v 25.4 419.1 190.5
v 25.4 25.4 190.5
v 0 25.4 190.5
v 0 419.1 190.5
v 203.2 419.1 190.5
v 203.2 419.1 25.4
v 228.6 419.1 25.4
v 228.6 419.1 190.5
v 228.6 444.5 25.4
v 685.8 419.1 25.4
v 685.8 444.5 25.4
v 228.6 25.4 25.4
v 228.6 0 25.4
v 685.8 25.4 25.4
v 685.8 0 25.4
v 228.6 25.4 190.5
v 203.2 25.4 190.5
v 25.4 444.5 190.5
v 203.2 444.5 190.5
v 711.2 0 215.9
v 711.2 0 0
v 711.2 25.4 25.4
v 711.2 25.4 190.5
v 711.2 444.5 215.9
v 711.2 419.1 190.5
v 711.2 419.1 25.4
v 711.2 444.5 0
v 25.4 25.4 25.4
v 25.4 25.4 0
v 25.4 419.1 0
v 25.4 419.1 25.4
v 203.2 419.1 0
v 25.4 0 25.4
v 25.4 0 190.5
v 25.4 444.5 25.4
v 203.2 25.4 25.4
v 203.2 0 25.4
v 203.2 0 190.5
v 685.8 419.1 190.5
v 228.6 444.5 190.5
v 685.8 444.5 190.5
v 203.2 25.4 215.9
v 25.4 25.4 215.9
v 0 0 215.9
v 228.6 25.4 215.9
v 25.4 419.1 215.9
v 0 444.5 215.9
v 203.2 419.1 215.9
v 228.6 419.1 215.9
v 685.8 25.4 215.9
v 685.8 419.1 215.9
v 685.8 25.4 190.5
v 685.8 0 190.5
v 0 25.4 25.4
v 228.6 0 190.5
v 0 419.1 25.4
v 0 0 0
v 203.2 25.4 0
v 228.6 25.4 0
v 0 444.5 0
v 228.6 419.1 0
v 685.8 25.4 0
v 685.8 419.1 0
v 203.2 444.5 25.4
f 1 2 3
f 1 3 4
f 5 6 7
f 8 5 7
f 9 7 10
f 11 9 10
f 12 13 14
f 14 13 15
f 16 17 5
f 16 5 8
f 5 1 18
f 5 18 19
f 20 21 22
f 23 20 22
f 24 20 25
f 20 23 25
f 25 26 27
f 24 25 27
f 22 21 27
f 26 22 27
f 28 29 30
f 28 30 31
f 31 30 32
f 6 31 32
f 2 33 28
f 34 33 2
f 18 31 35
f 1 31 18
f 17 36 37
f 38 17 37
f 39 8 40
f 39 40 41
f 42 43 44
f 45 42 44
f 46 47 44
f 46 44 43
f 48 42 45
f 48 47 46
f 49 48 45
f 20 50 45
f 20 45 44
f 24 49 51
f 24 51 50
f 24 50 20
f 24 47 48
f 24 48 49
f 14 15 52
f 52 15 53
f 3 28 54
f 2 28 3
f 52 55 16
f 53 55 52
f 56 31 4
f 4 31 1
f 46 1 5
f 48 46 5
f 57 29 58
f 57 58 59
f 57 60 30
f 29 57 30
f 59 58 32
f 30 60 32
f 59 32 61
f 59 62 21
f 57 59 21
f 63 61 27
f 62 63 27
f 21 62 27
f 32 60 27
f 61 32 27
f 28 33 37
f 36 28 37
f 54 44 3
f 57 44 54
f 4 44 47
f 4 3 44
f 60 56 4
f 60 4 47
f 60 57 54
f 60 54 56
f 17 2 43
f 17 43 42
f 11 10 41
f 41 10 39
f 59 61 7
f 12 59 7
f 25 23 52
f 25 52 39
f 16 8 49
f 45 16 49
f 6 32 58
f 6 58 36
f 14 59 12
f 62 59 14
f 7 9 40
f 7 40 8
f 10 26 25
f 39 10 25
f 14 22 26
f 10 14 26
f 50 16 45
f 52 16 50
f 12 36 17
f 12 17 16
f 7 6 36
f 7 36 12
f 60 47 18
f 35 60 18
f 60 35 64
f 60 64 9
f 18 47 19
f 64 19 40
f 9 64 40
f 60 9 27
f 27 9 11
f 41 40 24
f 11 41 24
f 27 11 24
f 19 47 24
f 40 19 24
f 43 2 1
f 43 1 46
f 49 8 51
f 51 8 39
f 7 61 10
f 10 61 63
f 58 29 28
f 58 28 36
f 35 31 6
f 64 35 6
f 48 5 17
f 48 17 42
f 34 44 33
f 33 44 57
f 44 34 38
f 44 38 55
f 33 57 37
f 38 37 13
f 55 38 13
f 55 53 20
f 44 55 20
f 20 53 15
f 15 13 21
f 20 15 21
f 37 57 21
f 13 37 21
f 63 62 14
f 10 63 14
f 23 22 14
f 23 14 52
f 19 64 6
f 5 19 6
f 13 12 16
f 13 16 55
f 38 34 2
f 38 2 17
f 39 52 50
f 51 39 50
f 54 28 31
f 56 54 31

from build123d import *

# Parameters (mm, degrees)
F0_W      = 711.2
F0_H      = 444.5
F0_W_2    = 660.4
F0_H_2    = 393.7
F1_DEPTH  = 215.9
F2_W      = 660.4
F2_H      = 165.1
F3_DEPTH  = 444.501
F4_W      = 393.7
F4_H      = 165.1
F5_DEPTH  = 711.201
F6_W      = 25.4
F6_H      = 25.4
F7_DEPTH  = 393.7
F8_W      = 25.4
F8_H      = 25.4
F9_DEPTH  = 393.7
F10_W     = 25.4
F10_H     = 25.4
F11_DEPTH = 165.1


with BuildPart() as f1:
    # F0 (on Top) → F1 (new body)
    with BuildSketch(Plane.XY):
        with Locations((355.6, 222.25)):
            Rectangle(F0_W, F0_H)
        with Locations((355.6, 222.25)):
            Rectangle(F0_W_2, F0_H_2, mode=Mode.SUBTRACT)
    extrude(amount=F1_DEPTH)

    # F2 (on face) → F3 (cut, through all)
    with BuildSketch(Plane.XZ):
        with Locations((355.6, 107.95)):
            Rectangle(F2_W, F2_H)
    extrude(amount=-F3_DEPTH, mode=Mode.SUBTRACT)

    # F4 (on face) → F5 (cut, through all)
    with BuildSketch(Plane.YZ.offset(711.2)):
        with Locations((222.25, 107.95)):
            Rectangle(F4_W, F4_H)
    extrude(amount=-F5_DEPTH, mode=Mode.SUBTRACT)

    # F6 (on face) → F7 (join, through all)
    with BuildSketch(Plane.XZ.offset(-419.1)):
        with Locations((215.9, 203.2)):
            Rectangle(F6_W, F6_H)
    extrude(amount=F7_DEPTH)

    # F8 (on face) → F9 (join, through all)
    with BuildSketch(Plane(origin=(0, 25.4, 0), x_dir=(-1, 0, 0), z_dir=(0, 1, 0))):
        with Locations((-215.9, 12.7)):
            Rectangle(F8_W, F8_H)
    extrude(amount=F9_DEPTH)

    # F10 (on face) → F11 (join, through all)
    with BuildSketch(Plane(origin=(0, 0, 190.5), x_dir=(1, 0, 0), z_dir=(0, 0, -1))):
        with Locations((215.9, -431.8)):
            Rectangle(F10_W, F10_H)
        with Locations((215.9, -12.7)):
            Rectangle(F10_W, F10_H)
    extrude(amount=F11_DEPTH)


solid = f1.part
